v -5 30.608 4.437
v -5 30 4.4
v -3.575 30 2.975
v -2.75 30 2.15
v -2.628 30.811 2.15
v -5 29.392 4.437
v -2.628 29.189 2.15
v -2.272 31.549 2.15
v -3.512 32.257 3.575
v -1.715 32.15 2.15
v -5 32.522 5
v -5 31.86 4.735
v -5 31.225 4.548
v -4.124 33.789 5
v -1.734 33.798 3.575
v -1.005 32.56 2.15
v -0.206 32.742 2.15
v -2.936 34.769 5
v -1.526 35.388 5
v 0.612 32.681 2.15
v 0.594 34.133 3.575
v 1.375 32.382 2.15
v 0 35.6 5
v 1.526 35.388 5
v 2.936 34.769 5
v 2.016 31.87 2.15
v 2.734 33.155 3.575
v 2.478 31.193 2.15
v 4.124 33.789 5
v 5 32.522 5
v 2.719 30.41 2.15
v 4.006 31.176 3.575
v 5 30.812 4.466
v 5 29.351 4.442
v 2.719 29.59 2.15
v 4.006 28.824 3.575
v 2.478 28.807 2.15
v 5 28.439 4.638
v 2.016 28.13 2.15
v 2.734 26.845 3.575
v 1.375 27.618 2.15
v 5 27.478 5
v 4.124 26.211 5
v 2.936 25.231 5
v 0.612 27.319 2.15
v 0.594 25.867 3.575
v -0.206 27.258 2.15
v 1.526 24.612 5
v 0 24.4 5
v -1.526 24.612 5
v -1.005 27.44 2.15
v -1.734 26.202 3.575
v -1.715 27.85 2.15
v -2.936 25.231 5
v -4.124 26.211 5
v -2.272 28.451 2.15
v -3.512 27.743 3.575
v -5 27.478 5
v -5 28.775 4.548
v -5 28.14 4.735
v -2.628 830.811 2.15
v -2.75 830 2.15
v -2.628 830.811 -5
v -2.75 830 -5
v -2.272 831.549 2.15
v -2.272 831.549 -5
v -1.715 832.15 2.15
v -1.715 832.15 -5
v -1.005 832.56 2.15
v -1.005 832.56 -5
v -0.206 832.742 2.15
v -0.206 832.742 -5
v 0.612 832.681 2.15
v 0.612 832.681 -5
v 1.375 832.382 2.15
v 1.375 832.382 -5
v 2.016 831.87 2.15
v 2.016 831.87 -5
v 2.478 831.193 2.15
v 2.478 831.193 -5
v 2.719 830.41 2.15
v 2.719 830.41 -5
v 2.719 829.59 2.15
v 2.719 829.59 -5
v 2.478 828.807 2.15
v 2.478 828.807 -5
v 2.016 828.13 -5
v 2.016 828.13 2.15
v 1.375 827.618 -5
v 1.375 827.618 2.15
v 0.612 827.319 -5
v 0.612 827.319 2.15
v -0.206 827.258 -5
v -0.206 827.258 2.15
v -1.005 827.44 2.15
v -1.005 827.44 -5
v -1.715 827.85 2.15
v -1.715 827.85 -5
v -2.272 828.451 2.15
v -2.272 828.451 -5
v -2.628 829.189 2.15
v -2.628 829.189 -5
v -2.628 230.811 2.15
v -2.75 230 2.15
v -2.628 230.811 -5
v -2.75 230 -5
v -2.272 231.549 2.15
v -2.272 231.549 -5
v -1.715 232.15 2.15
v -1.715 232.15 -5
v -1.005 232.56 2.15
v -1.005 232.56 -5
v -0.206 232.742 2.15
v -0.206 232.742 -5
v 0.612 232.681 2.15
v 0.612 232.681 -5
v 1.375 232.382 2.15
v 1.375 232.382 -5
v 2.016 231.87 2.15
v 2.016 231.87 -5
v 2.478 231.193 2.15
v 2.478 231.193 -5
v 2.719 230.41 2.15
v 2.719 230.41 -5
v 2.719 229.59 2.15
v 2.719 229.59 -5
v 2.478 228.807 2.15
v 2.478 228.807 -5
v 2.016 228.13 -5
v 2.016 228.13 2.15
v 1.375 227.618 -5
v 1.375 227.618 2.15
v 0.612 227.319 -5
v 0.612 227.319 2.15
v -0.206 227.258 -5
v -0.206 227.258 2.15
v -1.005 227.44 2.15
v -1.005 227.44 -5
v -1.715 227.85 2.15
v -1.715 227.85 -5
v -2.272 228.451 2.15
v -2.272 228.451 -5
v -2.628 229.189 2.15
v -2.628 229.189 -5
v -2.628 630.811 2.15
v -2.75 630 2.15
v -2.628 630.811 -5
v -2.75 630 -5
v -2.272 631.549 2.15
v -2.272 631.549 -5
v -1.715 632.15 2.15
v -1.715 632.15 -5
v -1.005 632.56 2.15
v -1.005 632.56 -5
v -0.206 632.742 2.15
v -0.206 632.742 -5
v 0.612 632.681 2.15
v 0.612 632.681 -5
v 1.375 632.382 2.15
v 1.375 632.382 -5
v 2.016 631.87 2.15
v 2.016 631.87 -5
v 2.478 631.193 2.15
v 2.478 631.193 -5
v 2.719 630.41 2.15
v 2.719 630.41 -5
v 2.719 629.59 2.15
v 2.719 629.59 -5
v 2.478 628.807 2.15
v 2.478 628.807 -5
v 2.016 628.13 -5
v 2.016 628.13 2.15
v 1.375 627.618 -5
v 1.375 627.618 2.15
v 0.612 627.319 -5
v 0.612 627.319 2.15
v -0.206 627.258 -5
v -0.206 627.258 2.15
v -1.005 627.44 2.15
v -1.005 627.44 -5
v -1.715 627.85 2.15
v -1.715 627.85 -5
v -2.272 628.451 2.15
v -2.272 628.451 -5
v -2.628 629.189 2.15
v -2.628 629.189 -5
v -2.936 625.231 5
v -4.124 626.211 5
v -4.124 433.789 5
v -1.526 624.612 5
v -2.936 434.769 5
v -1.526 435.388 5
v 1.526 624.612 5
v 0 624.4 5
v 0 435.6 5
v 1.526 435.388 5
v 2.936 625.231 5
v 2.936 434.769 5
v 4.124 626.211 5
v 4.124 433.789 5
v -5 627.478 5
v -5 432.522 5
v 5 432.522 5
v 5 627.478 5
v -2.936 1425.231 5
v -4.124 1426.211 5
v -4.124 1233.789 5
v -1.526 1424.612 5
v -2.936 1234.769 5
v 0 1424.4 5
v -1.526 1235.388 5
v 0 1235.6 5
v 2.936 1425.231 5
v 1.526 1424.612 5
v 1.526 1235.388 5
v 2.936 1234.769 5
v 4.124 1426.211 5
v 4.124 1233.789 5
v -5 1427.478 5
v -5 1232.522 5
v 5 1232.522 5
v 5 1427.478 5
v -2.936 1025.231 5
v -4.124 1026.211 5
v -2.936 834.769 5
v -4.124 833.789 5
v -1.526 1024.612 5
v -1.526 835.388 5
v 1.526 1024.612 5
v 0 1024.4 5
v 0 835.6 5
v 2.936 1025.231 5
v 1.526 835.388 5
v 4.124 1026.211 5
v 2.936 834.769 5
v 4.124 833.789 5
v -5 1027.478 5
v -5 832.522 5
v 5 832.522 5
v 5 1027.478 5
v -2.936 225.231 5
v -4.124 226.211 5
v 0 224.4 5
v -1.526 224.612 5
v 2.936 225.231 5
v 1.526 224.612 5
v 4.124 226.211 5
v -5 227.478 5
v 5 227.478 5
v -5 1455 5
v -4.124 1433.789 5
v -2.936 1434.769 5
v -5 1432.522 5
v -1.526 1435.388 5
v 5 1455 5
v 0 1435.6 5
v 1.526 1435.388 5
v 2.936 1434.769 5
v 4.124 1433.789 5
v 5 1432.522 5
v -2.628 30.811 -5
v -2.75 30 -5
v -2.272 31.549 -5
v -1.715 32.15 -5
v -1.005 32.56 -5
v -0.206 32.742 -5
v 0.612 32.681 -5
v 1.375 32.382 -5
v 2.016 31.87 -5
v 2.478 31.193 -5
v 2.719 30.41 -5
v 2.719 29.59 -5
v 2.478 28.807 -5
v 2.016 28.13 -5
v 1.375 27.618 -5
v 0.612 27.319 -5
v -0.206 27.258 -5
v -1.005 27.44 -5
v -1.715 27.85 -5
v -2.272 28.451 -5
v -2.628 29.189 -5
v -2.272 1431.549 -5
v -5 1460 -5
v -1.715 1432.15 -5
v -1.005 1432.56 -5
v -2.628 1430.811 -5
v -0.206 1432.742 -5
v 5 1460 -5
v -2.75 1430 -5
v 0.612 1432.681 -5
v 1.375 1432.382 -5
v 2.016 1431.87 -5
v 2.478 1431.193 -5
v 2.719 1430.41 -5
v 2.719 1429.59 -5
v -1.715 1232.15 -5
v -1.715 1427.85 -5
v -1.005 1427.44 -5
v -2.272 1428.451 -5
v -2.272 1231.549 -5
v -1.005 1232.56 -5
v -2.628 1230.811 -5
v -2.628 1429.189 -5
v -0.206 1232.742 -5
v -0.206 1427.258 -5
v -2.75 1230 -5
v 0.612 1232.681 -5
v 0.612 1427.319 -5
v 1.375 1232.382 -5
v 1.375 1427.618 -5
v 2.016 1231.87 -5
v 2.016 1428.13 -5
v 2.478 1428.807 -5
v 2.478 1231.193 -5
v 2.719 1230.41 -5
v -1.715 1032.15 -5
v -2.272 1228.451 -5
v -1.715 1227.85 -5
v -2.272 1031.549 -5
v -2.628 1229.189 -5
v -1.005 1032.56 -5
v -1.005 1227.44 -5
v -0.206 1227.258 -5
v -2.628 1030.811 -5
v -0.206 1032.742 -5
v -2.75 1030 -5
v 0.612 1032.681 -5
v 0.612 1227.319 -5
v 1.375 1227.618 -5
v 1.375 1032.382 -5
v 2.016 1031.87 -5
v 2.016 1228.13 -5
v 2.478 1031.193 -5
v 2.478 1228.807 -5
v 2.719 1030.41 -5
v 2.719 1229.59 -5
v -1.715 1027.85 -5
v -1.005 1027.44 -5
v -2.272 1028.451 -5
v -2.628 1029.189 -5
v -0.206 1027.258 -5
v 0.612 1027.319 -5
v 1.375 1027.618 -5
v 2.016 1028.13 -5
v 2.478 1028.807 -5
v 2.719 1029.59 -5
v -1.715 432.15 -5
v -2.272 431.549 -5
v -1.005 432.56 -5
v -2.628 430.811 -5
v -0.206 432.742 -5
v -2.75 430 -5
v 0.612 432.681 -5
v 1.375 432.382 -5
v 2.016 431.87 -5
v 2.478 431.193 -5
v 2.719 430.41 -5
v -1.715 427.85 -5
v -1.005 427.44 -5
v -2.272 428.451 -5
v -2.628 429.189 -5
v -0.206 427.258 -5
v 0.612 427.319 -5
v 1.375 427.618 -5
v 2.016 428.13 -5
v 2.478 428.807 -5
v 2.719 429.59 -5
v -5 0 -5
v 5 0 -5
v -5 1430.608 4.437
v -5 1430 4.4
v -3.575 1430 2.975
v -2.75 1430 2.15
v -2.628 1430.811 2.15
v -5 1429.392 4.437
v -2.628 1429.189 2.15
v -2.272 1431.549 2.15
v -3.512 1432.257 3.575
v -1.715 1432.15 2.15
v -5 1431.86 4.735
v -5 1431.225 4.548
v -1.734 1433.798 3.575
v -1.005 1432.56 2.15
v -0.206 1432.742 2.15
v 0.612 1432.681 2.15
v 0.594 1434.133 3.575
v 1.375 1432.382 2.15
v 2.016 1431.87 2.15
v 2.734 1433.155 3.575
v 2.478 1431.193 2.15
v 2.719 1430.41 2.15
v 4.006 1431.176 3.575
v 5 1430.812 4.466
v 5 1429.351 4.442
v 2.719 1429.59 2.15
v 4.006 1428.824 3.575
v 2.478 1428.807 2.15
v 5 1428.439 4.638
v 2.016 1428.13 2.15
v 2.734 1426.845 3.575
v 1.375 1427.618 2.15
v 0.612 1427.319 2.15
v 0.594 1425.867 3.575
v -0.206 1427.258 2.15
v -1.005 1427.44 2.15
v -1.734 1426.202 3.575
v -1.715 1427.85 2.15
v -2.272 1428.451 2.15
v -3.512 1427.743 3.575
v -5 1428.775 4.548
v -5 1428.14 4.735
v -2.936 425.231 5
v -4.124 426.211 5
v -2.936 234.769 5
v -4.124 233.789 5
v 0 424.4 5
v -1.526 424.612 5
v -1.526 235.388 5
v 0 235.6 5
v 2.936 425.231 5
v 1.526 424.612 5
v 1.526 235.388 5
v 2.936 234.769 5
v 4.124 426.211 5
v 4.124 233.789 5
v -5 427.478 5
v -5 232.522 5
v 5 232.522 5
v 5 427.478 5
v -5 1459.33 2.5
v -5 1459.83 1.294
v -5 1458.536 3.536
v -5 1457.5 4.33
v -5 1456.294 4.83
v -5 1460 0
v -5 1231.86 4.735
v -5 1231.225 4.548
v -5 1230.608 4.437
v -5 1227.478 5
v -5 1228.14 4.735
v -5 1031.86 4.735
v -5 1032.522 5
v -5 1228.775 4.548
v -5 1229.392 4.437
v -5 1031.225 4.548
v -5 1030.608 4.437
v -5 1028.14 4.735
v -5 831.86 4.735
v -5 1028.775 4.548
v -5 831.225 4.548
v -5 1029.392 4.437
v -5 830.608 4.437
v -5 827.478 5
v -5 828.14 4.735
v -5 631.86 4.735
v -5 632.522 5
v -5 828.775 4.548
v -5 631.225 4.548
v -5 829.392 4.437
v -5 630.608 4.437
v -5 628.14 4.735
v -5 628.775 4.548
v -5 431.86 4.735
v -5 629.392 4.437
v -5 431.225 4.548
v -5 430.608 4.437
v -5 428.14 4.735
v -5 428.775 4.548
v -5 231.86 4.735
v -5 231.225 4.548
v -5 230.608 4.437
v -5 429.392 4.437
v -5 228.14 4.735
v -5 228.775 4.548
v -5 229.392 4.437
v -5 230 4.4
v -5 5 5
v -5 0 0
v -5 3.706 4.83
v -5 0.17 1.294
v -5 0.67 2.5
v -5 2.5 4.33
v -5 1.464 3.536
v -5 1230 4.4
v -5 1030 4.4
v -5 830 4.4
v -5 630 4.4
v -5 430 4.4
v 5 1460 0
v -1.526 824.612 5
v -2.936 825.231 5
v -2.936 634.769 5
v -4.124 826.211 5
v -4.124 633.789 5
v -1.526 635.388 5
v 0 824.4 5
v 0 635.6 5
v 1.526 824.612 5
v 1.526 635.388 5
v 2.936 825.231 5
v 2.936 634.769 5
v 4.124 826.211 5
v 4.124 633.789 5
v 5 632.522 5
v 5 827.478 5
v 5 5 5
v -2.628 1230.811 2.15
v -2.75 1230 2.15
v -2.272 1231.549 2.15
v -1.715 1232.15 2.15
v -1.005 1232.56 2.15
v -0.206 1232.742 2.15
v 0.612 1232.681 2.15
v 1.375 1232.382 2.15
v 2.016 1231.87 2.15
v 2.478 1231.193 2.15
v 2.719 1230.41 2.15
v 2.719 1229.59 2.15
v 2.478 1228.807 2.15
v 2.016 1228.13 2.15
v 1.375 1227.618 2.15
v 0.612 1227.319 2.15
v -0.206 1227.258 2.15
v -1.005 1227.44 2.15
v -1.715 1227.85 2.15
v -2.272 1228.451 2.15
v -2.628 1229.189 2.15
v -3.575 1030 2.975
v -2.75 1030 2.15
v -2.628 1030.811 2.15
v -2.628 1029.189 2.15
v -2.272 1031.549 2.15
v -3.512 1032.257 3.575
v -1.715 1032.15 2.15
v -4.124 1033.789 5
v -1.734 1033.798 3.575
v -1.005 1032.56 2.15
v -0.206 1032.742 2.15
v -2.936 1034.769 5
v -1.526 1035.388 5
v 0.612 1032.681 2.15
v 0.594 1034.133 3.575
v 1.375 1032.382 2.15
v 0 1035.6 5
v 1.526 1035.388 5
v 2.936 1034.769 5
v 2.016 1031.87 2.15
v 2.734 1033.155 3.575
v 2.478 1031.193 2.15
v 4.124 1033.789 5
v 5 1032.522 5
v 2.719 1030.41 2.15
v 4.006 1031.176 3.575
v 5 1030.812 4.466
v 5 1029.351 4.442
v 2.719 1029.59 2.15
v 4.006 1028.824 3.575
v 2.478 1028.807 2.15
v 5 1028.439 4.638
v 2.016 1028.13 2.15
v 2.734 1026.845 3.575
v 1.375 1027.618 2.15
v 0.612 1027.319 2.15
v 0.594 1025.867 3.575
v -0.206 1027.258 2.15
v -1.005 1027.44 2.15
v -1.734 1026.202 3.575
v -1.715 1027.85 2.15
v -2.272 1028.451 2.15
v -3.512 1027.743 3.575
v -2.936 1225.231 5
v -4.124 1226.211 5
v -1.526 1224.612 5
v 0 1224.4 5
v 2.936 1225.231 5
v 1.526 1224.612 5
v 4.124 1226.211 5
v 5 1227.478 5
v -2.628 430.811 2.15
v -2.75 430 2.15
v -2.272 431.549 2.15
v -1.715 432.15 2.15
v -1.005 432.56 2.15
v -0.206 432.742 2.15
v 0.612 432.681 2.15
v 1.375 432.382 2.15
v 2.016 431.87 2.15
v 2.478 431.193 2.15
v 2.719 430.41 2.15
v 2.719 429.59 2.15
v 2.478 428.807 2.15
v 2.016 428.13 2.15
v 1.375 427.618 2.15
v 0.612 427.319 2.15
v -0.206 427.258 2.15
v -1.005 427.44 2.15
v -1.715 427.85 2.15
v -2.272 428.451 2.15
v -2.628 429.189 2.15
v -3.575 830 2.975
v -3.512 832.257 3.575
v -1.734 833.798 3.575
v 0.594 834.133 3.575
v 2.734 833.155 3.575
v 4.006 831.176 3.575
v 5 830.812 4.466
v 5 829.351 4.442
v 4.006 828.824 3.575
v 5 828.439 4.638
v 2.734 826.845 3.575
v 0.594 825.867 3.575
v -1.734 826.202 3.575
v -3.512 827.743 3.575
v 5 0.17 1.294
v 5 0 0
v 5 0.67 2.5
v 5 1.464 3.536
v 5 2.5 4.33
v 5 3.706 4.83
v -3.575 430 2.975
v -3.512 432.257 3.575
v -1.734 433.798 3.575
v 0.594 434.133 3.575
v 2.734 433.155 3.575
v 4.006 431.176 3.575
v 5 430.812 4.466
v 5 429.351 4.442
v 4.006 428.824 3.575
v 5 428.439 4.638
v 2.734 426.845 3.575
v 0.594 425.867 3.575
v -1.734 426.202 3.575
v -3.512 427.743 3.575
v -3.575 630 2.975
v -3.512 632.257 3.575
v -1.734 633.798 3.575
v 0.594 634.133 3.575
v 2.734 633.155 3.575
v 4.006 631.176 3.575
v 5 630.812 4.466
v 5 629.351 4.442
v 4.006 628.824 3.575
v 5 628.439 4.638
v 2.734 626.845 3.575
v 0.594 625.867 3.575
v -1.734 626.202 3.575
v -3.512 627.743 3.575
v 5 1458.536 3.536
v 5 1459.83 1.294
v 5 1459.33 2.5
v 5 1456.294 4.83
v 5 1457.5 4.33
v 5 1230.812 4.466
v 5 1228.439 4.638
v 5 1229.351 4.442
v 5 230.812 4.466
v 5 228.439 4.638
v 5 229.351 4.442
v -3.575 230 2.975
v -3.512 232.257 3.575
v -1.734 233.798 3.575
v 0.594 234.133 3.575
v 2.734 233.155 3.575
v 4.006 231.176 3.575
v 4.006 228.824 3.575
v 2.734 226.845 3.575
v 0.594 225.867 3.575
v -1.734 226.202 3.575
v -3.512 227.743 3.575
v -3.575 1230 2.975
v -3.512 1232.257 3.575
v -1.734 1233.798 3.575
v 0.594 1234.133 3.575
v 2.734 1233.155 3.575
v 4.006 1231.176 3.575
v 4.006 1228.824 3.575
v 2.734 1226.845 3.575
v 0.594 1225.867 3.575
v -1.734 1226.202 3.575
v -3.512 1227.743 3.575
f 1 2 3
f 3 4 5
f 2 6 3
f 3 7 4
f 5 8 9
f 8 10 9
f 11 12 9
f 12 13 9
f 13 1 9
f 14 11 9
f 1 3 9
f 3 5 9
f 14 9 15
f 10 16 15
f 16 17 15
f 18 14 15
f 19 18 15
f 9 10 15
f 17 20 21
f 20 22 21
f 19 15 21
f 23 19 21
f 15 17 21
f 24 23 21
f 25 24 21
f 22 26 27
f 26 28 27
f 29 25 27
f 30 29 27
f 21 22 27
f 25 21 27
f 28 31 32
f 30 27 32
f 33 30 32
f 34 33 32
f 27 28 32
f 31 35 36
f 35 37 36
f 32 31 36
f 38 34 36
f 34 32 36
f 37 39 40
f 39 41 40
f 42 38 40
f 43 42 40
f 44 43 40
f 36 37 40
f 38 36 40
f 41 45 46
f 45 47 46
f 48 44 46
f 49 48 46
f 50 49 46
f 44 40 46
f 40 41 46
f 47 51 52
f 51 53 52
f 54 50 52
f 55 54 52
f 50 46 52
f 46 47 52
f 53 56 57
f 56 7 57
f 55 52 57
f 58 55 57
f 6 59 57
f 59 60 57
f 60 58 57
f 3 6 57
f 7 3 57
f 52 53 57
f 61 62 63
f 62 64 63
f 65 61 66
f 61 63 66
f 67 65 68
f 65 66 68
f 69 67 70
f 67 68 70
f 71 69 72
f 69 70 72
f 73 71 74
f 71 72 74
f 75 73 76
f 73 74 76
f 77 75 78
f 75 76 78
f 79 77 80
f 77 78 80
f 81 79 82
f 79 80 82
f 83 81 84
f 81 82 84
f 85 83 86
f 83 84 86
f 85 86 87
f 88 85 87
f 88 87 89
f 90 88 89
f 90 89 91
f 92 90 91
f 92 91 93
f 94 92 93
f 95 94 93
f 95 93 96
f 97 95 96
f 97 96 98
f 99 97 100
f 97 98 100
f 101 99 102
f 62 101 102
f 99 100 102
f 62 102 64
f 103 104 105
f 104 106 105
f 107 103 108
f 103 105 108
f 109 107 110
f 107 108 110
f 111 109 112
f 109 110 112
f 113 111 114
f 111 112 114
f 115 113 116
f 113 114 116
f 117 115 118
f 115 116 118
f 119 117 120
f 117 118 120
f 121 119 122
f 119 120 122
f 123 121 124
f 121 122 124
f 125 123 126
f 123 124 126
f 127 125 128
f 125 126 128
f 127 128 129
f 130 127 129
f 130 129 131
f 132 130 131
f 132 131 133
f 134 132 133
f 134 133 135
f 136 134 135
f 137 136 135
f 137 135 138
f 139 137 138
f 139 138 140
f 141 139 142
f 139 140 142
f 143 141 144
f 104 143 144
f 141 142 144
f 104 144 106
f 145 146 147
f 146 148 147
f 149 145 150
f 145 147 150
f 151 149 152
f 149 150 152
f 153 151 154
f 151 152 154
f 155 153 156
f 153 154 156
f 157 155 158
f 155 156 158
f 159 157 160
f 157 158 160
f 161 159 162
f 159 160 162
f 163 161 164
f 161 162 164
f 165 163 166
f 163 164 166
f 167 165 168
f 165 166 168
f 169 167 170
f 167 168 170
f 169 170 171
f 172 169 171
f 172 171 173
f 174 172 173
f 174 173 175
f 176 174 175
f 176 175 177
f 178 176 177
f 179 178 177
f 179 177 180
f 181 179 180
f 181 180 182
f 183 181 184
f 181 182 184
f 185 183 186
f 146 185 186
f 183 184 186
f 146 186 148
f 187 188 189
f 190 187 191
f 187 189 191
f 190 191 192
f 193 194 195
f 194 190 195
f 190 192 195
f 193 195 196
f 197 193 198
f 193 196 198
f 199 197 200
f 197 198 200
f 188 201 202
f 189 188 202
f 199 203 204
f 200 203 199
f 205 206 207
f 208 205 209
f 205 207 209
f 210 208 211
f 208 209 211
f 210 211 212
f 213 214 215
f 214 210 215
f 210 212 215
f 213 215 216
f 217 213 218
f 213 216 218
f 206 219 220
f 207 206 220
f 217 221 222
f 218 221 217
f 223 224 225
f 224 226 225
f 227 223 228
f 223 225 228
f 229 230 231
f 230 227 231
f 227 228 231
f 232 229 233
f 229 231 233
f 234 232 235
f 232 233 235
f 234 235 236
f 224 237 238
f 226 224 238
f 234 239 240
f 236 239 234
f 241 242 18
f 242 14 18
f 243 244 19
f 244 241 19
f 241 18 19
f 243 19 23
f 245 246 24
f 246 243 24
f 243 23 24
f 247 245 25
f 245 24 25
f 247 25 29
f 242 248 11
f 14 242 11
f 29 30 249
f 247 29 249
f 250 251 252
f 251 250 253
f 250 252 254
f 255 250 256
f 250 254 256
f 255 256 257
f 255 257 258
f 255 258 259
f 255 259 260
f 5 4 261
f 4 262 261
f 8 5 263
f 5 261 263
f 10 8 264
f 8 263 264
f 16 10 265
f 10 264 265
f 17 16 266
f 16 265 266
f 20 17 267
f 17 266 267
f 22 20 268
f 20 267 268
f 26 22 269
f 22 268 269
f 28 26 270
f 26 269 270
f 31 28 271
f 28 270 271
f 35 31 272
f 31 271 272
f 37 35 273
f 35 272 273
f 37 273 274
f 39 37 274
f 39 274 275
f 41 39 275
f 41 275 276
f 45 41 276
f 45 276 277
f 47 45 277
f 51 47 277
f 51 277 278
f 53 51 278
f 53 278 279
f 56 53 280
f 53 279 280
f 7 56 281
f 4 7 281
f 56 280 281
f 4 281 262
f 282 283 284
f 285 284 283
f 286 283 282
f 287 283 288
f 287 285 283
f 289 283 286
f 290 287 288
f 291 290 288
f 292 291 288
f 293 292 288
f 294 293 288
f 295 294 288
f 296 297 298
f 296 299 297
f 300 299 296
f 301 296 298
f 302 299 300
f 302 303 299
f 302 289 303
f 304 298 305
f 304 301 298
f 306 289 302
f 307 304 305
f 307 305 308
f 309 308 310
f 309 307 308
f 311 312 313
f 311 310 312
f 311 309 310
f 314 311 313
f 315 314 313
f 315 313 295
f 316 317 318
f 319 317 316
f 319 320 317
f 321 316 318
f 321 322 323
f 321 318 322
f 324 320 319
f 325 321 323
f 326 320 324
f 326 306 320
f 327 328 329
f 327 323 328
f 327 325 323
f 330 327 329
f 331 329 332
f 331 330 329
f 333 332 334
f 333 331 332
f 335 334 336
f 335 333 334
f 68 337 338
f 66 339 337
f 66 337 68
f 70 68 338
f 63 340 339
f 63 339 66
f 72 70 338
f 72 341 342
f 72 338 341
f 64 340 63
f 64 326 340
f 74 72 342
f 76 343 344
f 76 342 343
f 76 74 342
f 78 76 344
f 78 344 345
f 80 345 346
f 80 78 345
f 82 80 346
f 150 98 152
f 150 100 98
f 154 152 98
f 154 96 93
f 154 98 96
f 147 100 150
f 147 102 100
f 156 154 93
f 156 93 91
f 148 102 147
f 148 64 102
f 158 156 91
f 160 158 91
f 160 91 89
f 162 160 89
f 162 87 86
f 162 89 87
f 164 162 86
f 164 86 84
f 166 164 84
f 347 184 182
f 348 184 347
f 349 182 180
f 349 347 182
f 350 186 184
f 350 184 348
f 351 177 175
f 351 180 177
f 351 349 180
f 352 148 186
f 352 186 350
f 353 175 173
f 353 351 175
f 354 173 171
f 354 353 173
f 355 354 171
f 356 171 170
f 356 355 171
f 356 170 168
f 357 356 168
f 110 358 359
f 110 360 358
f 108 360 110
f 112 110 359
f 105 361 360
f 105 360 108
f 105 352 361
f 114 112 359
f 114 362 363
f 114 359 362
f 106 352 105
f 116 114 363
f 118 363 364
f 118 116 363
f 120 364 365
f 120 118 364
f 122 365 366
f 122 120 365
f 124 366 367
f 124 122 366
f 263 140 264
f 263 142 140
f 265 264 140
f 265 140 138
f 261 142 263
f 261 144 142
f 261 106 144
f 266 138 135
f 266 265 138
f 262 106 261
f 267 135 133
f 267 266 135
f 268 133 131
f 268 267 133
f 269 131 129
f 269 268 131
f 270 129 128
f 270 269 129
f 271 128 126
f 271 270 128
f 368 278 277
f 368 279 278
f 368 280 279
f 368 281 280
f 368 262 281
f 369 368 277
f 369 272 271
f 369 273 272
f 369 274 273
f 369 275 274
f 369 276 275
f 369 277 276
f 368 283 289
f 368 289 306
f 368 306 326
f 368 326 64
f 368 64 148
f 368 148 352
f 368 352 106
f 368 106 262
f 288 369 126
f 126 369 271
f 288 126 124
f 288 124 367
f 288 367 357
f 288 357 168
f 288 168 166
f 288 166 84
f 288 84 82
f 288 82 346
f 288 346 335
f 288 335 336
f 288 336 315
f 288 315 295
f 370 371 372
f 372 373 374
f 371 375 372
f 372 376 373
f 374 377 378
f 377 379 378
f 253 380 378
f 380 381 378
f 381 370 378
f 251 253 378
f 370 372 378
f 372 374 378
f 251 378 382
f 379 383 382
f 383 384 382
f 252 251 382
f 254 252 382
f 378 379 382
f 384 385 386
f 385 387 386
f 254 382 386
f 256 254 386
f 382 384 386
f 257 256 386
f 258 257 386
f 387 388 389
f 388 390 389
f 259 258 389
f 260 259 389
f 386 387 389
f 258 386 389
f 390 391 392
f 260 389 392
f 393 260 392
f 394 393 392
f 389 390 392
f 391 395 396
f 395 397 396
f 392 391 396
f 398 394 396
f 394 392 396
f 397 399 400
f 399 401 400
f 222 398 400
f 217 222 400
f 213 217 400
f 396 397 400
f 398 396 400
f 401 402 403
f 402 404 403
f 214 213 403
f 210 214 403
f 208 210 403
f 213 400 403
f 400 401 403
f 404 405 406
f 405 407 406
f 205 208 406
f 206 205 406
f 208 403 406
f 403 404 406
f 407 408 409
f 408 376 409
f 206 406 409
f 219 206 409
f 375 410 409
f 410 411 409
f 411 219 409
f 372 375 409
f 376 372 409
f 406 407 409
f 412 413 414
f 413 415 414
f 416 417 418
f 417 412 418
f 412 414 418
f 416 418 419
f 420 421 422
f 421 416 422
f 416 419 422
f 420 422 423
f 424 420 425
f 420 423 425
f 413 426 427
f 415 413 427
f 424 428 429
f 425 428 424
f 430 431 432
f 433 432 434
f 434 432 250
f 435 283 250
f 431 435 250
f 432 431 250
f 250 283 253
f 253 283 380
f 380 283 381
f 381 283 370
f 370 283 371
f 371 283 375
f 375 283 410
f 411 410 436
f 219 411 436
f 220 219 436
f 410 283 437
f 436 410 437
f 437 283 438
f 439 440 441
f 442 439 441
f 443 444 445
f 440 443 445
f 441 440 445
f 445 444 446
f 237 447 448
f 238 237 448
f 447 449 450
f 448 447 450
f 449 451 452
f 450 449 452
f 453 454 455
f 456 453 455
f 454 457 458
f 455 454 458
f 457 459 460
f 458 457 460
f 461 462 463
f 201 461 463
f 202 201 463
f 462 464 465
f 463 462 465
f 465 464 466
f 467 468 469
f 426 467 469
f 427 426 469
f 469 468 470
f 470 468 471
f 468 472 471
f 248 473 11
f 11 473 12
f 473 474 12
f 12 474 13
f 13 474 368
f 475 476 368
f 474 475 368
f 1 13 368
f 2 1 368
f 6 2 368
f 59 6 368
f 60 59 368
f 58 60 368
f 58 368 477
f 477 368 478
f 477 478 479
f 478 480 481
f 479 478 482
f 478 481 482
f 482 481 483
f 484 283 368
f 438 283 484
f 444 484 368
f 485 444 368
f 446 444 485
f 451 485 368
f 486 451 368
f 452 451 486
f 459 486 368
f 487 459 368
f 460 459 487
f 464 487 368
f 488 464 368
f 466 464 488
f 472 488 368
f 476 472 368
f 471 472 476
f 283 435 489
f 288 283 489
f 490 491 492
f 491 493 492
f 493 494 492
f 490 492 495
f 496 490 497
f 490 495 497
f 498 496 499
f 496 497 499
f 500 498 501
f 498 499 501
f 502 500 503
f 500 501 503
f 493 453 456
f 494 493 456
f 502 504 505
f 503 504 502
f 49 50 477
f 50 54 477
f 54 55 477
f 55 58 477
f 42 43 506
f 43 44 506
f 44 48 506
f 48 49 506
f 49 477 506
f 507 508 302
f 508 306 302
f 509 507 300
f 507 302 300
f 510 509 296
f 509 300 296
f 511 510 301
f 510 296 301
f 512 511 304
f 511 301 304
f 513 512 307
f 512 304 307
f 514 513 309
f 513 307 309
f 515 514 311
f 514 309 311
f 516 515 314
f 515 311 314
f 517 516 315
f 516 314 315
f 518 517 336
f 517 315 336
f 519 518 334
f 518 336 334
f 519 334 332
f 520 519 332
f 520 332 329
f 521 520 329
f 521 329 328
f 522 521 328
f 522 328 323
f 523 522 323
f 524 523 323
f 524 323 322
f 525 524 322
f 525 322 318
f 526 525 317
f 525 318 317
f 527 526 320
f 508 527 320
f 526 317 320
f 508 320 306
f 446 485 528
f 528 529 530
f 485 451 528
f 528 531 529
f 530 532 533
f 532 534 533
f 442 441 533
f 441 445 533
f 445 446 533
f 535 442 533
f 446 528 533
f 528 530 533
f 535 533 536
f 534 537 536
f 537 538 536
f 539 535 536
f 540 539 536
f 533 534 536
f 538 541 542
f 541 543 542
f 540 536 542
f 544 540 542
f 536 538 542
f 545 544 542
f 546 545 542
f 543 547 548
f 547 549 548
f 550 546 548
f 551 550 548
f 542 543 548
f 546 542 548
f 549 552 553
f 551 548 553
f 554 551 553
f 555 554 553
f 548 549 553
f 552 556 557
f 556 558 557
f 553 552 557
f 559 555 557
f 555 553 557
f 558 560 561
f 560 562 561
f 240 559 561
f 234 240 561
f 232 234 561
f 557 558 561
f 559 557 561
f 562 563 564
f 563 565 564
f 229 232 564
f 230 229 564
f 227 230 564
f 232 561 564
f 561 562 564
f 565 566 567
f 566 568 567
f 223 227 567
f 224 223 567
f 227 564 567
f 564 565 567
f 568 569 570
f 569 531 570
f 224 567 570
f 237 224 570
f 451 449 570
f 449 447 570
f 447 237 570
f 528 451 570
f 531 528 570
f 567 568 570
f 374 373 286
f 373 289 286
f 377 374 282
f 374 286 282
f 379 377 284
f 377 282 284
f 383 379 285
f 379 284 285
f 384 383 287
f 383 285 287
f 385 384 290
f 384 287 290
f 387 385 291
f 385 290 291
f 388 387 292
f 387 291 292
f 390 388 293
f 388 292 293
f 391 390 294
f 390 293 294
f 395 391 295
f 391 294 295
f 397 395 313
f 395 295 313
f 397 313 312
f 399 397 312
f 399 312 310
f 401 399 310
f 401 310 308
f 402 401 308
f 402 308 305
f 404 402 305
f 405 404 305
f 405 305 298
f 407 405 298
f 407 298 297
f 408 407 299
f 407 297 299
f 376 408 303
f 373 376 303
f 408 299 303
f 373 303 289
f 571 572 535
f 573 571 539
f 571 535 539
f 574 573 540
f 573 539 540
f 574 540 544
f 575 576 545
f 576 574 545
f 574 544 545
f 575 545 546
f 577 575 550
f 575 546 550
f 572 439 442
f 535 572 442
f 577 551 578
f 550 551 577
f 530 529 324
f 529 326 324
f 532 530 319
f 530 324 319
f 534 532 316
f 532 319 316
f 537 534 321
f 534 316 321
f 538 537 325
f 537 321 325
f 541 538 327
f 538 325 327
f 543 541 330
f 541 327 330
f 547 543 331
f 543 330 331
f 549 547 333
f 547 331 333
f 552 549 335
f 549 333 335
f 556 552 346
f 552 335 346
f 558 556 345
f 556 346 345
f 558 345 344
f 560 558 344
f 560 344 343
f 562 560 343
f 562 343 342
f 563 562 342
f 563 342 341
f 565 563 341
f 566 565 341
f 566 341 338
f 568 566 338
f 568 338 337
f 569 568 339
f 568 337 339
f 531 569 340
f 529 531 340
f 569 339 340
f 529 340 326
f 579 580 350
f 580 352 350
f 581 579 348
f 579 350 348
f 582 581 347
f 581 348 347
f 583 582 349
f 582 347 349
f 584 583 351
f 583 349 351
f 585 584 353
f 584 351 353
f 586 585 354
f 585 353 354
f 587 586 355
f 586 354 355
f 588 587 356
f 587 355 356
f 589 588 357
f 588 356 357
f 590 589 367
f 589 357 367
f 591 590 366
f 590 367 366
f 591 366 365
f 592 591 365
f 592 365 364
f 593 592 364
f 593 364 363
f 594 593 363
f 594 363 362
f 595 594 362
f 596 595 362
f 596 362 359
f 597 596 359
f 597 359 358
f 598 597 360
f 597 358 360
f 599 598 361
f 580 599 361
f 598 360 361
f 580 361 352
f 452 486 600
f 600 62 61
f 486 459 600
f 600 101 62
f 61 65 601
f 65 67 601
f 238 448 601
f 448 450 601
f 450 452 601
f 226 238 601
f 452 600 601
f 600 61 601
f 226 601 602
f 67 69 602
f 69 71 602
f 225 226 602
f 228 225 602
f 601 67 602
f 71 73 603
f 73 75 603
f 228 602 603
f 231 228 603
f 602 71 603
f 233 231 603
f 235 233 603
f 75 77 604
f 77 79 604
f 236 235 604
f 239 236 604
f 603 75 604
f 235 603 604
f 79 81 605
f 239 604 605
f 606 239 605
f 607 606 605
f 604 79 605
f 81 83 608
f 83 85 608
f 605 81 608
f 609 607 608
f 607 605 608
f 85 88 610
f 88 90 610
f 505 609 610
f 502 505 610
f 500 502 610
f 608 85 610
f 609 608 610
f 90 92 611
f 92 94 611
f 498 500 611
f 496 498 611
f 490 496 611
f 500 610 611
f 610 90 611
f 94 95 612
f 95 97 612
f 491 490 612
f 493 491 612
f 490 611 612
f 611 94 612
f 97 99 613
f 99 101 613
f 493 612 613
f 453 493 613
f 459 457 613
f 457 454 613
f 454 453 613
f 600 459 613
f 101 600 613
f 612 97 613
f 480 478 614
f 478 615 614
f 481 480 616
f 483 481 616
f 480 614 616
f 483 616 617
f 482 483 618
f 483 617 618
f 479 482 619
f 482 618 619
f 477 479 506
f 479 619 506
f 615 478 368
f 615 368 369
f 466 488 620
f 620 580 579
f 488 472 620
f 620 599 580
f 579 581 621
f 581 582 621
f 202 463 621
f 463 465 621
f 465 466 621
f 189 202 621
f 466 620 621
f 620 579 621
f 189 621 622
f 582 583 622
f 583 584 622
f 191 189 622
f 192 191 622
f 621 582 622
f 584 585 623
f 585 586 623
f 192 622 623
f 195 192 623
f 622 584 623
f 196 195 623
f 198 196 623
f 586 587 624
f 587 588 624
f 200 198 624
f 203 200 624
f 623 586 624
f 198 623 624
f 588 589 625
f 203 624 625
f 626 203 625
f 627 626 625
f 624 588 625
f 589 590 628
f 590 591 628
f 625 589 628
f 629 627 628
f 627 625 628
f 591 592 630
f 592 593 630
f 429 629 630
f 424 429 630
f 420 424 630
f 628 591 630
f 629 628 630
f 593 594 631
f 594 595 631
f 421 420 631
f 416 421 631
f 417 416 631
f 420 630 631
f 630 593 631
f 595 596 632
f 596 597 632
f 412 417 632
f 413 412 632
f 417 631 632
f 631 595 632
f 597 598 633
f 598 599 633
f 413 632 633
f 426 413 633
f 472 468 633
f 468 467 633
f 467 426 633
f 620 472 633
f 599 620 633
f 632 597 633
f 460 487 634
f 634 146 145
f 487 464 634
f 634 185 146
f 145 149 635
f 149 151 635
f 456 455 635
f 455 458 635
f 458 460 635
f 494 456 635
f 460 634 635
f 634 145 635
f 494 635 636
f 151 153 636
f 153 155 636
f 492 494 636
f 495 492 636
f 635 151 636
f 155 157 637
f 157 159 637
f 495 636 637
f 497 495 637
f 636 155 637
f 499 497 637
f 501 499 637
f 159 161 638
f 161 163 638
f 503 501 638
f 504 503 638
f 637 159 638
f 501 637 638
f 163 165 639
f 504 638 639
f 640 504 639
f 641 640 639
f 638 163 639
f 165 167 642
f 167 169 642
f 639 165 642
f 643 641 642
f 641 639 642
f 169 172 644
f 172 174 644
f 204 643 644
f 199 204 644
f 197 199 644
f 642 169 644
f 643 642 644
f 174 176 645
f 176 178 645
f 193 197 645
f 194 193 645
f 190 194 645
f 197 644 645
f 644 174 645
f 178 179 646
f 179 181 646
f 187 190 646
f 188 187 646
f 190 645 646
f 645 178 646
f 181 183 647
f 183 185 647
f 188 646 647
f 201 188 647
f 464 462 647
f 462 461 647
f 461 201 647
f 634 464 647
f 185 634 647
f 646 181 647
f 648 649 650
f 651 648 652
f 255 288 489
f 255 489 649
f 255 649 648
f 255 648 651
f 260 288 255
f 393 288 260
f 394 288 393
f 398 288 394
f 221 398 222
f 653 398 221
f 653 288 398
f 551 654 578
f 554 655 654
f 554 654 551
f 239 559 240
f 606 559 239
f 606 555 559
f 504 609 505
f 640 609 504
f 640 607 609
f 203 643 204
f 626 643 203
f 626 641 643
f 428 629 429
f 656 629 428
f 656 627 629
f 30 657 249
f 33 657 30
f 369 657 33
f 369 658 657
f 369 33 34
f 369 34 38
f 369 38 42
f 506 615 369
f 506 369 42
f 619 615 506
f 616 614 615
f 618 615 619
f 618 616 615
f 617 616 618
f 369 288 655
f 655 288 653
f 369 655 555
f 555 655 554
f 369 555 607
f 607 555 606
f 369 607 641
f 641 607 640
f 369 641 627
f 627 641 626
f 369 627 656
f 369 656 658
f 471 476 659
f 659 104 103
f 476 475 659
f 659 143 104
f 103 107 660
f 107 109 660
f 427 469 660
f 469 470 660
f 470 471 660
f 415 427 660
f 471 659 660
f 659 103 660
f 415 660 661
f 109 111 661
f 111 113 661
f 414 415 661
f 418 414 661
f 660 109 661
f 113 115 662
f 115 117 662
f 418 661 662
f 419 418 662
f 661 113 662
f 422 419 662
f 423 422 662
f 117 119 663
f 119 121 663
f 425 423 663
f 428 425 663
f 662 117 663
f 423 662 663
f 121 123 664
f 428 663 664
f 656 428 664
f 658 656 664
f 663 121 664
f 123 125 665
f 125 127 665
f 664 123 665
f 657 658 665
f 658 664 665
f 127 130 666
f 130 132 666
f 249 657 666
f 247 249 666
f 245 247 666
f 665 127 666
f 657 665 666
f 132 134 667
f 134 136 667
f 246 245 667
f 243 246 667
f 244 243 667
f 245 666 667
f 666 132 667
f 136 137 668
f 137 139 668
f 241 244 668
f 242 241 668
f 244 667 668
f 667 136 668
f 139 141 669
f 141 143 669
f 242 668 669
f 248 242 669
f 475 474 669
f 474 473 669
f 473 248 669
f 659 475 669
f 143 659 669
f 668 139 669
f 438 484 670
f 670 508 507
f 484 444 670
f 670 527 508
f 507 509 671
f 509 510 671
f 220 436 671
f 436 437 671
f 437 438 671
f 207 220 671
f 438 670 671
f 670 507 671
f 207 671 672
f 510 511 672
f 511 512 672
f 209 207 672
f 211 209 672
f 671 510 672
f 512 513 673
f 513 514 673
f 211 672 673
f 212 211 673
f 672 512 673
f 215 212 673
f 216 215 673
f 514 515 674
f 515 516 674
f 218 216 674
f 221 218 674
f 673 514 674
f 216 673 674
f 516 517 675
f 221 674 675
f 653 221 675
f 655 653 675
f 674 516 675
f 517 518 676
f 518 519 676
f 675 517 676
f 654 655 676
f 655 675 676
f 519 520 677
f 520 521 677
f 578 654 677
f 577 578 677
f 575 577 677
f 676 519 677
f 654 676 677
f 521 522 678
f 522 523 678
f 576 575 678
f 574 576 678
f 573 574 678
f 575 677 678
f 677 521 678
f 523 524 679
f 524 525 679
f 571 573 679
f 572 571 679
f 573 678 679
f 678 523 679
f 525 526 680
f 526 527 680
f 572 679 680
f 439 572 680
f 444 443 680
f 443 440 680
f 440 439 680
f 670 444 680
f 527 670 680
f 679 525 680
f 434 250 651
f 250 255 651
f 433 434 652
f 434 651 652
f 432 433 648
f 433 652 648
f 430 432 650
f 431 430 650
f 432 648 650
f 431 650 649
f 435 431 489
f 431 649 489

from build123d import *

# Parameters (mm, degrees)
F0_W           = 10
F0_H           = 10
F1_DEPTH       = 1460
F3_D           = 5.5
F3_CSINK_D     = 11.2
F3_CSINK_ANGLE = 90
F4_R           = 5
F5_R           = 5


# Not quite as in the source:
# - a feature names something its author has since deleted; it is built from what else it names


with BuildPart() as f1:
    # F0 (on Front) → F1 (new body)
    with BuildSketch(Plane.XZ):
        Rectangle(F0_W, F0_H)
    extrude(amount=-F1_DEPTH)

    # F3 (through all)
    with Locations(Plane.XY.offset(5)):
        with Locations((0, 30), (0, 230), (0, 430), (0, 630), (0, 830), (0, 1030), (0, 1230), (0, 1430)):
            CounterSinkHole(F3_D / 2, F3_CSINK_D / 2, counter_sink_angle=F3_CSINK_ANGLE)

    # F4
    f4_edges = [f1.edges().sort_by_distance(p)[0] for p in [
        (0, 1460, 5),
    ]]
    fillet(f4_edges, radius=F4_R)

    # F5
    f5_edges = [f1.edges().sort_by_distance(p)[0] for p in [
        (0, 0, 5),
    ]]
    fillet(f5_edges, radius=F5_R)


solid = f1.part
